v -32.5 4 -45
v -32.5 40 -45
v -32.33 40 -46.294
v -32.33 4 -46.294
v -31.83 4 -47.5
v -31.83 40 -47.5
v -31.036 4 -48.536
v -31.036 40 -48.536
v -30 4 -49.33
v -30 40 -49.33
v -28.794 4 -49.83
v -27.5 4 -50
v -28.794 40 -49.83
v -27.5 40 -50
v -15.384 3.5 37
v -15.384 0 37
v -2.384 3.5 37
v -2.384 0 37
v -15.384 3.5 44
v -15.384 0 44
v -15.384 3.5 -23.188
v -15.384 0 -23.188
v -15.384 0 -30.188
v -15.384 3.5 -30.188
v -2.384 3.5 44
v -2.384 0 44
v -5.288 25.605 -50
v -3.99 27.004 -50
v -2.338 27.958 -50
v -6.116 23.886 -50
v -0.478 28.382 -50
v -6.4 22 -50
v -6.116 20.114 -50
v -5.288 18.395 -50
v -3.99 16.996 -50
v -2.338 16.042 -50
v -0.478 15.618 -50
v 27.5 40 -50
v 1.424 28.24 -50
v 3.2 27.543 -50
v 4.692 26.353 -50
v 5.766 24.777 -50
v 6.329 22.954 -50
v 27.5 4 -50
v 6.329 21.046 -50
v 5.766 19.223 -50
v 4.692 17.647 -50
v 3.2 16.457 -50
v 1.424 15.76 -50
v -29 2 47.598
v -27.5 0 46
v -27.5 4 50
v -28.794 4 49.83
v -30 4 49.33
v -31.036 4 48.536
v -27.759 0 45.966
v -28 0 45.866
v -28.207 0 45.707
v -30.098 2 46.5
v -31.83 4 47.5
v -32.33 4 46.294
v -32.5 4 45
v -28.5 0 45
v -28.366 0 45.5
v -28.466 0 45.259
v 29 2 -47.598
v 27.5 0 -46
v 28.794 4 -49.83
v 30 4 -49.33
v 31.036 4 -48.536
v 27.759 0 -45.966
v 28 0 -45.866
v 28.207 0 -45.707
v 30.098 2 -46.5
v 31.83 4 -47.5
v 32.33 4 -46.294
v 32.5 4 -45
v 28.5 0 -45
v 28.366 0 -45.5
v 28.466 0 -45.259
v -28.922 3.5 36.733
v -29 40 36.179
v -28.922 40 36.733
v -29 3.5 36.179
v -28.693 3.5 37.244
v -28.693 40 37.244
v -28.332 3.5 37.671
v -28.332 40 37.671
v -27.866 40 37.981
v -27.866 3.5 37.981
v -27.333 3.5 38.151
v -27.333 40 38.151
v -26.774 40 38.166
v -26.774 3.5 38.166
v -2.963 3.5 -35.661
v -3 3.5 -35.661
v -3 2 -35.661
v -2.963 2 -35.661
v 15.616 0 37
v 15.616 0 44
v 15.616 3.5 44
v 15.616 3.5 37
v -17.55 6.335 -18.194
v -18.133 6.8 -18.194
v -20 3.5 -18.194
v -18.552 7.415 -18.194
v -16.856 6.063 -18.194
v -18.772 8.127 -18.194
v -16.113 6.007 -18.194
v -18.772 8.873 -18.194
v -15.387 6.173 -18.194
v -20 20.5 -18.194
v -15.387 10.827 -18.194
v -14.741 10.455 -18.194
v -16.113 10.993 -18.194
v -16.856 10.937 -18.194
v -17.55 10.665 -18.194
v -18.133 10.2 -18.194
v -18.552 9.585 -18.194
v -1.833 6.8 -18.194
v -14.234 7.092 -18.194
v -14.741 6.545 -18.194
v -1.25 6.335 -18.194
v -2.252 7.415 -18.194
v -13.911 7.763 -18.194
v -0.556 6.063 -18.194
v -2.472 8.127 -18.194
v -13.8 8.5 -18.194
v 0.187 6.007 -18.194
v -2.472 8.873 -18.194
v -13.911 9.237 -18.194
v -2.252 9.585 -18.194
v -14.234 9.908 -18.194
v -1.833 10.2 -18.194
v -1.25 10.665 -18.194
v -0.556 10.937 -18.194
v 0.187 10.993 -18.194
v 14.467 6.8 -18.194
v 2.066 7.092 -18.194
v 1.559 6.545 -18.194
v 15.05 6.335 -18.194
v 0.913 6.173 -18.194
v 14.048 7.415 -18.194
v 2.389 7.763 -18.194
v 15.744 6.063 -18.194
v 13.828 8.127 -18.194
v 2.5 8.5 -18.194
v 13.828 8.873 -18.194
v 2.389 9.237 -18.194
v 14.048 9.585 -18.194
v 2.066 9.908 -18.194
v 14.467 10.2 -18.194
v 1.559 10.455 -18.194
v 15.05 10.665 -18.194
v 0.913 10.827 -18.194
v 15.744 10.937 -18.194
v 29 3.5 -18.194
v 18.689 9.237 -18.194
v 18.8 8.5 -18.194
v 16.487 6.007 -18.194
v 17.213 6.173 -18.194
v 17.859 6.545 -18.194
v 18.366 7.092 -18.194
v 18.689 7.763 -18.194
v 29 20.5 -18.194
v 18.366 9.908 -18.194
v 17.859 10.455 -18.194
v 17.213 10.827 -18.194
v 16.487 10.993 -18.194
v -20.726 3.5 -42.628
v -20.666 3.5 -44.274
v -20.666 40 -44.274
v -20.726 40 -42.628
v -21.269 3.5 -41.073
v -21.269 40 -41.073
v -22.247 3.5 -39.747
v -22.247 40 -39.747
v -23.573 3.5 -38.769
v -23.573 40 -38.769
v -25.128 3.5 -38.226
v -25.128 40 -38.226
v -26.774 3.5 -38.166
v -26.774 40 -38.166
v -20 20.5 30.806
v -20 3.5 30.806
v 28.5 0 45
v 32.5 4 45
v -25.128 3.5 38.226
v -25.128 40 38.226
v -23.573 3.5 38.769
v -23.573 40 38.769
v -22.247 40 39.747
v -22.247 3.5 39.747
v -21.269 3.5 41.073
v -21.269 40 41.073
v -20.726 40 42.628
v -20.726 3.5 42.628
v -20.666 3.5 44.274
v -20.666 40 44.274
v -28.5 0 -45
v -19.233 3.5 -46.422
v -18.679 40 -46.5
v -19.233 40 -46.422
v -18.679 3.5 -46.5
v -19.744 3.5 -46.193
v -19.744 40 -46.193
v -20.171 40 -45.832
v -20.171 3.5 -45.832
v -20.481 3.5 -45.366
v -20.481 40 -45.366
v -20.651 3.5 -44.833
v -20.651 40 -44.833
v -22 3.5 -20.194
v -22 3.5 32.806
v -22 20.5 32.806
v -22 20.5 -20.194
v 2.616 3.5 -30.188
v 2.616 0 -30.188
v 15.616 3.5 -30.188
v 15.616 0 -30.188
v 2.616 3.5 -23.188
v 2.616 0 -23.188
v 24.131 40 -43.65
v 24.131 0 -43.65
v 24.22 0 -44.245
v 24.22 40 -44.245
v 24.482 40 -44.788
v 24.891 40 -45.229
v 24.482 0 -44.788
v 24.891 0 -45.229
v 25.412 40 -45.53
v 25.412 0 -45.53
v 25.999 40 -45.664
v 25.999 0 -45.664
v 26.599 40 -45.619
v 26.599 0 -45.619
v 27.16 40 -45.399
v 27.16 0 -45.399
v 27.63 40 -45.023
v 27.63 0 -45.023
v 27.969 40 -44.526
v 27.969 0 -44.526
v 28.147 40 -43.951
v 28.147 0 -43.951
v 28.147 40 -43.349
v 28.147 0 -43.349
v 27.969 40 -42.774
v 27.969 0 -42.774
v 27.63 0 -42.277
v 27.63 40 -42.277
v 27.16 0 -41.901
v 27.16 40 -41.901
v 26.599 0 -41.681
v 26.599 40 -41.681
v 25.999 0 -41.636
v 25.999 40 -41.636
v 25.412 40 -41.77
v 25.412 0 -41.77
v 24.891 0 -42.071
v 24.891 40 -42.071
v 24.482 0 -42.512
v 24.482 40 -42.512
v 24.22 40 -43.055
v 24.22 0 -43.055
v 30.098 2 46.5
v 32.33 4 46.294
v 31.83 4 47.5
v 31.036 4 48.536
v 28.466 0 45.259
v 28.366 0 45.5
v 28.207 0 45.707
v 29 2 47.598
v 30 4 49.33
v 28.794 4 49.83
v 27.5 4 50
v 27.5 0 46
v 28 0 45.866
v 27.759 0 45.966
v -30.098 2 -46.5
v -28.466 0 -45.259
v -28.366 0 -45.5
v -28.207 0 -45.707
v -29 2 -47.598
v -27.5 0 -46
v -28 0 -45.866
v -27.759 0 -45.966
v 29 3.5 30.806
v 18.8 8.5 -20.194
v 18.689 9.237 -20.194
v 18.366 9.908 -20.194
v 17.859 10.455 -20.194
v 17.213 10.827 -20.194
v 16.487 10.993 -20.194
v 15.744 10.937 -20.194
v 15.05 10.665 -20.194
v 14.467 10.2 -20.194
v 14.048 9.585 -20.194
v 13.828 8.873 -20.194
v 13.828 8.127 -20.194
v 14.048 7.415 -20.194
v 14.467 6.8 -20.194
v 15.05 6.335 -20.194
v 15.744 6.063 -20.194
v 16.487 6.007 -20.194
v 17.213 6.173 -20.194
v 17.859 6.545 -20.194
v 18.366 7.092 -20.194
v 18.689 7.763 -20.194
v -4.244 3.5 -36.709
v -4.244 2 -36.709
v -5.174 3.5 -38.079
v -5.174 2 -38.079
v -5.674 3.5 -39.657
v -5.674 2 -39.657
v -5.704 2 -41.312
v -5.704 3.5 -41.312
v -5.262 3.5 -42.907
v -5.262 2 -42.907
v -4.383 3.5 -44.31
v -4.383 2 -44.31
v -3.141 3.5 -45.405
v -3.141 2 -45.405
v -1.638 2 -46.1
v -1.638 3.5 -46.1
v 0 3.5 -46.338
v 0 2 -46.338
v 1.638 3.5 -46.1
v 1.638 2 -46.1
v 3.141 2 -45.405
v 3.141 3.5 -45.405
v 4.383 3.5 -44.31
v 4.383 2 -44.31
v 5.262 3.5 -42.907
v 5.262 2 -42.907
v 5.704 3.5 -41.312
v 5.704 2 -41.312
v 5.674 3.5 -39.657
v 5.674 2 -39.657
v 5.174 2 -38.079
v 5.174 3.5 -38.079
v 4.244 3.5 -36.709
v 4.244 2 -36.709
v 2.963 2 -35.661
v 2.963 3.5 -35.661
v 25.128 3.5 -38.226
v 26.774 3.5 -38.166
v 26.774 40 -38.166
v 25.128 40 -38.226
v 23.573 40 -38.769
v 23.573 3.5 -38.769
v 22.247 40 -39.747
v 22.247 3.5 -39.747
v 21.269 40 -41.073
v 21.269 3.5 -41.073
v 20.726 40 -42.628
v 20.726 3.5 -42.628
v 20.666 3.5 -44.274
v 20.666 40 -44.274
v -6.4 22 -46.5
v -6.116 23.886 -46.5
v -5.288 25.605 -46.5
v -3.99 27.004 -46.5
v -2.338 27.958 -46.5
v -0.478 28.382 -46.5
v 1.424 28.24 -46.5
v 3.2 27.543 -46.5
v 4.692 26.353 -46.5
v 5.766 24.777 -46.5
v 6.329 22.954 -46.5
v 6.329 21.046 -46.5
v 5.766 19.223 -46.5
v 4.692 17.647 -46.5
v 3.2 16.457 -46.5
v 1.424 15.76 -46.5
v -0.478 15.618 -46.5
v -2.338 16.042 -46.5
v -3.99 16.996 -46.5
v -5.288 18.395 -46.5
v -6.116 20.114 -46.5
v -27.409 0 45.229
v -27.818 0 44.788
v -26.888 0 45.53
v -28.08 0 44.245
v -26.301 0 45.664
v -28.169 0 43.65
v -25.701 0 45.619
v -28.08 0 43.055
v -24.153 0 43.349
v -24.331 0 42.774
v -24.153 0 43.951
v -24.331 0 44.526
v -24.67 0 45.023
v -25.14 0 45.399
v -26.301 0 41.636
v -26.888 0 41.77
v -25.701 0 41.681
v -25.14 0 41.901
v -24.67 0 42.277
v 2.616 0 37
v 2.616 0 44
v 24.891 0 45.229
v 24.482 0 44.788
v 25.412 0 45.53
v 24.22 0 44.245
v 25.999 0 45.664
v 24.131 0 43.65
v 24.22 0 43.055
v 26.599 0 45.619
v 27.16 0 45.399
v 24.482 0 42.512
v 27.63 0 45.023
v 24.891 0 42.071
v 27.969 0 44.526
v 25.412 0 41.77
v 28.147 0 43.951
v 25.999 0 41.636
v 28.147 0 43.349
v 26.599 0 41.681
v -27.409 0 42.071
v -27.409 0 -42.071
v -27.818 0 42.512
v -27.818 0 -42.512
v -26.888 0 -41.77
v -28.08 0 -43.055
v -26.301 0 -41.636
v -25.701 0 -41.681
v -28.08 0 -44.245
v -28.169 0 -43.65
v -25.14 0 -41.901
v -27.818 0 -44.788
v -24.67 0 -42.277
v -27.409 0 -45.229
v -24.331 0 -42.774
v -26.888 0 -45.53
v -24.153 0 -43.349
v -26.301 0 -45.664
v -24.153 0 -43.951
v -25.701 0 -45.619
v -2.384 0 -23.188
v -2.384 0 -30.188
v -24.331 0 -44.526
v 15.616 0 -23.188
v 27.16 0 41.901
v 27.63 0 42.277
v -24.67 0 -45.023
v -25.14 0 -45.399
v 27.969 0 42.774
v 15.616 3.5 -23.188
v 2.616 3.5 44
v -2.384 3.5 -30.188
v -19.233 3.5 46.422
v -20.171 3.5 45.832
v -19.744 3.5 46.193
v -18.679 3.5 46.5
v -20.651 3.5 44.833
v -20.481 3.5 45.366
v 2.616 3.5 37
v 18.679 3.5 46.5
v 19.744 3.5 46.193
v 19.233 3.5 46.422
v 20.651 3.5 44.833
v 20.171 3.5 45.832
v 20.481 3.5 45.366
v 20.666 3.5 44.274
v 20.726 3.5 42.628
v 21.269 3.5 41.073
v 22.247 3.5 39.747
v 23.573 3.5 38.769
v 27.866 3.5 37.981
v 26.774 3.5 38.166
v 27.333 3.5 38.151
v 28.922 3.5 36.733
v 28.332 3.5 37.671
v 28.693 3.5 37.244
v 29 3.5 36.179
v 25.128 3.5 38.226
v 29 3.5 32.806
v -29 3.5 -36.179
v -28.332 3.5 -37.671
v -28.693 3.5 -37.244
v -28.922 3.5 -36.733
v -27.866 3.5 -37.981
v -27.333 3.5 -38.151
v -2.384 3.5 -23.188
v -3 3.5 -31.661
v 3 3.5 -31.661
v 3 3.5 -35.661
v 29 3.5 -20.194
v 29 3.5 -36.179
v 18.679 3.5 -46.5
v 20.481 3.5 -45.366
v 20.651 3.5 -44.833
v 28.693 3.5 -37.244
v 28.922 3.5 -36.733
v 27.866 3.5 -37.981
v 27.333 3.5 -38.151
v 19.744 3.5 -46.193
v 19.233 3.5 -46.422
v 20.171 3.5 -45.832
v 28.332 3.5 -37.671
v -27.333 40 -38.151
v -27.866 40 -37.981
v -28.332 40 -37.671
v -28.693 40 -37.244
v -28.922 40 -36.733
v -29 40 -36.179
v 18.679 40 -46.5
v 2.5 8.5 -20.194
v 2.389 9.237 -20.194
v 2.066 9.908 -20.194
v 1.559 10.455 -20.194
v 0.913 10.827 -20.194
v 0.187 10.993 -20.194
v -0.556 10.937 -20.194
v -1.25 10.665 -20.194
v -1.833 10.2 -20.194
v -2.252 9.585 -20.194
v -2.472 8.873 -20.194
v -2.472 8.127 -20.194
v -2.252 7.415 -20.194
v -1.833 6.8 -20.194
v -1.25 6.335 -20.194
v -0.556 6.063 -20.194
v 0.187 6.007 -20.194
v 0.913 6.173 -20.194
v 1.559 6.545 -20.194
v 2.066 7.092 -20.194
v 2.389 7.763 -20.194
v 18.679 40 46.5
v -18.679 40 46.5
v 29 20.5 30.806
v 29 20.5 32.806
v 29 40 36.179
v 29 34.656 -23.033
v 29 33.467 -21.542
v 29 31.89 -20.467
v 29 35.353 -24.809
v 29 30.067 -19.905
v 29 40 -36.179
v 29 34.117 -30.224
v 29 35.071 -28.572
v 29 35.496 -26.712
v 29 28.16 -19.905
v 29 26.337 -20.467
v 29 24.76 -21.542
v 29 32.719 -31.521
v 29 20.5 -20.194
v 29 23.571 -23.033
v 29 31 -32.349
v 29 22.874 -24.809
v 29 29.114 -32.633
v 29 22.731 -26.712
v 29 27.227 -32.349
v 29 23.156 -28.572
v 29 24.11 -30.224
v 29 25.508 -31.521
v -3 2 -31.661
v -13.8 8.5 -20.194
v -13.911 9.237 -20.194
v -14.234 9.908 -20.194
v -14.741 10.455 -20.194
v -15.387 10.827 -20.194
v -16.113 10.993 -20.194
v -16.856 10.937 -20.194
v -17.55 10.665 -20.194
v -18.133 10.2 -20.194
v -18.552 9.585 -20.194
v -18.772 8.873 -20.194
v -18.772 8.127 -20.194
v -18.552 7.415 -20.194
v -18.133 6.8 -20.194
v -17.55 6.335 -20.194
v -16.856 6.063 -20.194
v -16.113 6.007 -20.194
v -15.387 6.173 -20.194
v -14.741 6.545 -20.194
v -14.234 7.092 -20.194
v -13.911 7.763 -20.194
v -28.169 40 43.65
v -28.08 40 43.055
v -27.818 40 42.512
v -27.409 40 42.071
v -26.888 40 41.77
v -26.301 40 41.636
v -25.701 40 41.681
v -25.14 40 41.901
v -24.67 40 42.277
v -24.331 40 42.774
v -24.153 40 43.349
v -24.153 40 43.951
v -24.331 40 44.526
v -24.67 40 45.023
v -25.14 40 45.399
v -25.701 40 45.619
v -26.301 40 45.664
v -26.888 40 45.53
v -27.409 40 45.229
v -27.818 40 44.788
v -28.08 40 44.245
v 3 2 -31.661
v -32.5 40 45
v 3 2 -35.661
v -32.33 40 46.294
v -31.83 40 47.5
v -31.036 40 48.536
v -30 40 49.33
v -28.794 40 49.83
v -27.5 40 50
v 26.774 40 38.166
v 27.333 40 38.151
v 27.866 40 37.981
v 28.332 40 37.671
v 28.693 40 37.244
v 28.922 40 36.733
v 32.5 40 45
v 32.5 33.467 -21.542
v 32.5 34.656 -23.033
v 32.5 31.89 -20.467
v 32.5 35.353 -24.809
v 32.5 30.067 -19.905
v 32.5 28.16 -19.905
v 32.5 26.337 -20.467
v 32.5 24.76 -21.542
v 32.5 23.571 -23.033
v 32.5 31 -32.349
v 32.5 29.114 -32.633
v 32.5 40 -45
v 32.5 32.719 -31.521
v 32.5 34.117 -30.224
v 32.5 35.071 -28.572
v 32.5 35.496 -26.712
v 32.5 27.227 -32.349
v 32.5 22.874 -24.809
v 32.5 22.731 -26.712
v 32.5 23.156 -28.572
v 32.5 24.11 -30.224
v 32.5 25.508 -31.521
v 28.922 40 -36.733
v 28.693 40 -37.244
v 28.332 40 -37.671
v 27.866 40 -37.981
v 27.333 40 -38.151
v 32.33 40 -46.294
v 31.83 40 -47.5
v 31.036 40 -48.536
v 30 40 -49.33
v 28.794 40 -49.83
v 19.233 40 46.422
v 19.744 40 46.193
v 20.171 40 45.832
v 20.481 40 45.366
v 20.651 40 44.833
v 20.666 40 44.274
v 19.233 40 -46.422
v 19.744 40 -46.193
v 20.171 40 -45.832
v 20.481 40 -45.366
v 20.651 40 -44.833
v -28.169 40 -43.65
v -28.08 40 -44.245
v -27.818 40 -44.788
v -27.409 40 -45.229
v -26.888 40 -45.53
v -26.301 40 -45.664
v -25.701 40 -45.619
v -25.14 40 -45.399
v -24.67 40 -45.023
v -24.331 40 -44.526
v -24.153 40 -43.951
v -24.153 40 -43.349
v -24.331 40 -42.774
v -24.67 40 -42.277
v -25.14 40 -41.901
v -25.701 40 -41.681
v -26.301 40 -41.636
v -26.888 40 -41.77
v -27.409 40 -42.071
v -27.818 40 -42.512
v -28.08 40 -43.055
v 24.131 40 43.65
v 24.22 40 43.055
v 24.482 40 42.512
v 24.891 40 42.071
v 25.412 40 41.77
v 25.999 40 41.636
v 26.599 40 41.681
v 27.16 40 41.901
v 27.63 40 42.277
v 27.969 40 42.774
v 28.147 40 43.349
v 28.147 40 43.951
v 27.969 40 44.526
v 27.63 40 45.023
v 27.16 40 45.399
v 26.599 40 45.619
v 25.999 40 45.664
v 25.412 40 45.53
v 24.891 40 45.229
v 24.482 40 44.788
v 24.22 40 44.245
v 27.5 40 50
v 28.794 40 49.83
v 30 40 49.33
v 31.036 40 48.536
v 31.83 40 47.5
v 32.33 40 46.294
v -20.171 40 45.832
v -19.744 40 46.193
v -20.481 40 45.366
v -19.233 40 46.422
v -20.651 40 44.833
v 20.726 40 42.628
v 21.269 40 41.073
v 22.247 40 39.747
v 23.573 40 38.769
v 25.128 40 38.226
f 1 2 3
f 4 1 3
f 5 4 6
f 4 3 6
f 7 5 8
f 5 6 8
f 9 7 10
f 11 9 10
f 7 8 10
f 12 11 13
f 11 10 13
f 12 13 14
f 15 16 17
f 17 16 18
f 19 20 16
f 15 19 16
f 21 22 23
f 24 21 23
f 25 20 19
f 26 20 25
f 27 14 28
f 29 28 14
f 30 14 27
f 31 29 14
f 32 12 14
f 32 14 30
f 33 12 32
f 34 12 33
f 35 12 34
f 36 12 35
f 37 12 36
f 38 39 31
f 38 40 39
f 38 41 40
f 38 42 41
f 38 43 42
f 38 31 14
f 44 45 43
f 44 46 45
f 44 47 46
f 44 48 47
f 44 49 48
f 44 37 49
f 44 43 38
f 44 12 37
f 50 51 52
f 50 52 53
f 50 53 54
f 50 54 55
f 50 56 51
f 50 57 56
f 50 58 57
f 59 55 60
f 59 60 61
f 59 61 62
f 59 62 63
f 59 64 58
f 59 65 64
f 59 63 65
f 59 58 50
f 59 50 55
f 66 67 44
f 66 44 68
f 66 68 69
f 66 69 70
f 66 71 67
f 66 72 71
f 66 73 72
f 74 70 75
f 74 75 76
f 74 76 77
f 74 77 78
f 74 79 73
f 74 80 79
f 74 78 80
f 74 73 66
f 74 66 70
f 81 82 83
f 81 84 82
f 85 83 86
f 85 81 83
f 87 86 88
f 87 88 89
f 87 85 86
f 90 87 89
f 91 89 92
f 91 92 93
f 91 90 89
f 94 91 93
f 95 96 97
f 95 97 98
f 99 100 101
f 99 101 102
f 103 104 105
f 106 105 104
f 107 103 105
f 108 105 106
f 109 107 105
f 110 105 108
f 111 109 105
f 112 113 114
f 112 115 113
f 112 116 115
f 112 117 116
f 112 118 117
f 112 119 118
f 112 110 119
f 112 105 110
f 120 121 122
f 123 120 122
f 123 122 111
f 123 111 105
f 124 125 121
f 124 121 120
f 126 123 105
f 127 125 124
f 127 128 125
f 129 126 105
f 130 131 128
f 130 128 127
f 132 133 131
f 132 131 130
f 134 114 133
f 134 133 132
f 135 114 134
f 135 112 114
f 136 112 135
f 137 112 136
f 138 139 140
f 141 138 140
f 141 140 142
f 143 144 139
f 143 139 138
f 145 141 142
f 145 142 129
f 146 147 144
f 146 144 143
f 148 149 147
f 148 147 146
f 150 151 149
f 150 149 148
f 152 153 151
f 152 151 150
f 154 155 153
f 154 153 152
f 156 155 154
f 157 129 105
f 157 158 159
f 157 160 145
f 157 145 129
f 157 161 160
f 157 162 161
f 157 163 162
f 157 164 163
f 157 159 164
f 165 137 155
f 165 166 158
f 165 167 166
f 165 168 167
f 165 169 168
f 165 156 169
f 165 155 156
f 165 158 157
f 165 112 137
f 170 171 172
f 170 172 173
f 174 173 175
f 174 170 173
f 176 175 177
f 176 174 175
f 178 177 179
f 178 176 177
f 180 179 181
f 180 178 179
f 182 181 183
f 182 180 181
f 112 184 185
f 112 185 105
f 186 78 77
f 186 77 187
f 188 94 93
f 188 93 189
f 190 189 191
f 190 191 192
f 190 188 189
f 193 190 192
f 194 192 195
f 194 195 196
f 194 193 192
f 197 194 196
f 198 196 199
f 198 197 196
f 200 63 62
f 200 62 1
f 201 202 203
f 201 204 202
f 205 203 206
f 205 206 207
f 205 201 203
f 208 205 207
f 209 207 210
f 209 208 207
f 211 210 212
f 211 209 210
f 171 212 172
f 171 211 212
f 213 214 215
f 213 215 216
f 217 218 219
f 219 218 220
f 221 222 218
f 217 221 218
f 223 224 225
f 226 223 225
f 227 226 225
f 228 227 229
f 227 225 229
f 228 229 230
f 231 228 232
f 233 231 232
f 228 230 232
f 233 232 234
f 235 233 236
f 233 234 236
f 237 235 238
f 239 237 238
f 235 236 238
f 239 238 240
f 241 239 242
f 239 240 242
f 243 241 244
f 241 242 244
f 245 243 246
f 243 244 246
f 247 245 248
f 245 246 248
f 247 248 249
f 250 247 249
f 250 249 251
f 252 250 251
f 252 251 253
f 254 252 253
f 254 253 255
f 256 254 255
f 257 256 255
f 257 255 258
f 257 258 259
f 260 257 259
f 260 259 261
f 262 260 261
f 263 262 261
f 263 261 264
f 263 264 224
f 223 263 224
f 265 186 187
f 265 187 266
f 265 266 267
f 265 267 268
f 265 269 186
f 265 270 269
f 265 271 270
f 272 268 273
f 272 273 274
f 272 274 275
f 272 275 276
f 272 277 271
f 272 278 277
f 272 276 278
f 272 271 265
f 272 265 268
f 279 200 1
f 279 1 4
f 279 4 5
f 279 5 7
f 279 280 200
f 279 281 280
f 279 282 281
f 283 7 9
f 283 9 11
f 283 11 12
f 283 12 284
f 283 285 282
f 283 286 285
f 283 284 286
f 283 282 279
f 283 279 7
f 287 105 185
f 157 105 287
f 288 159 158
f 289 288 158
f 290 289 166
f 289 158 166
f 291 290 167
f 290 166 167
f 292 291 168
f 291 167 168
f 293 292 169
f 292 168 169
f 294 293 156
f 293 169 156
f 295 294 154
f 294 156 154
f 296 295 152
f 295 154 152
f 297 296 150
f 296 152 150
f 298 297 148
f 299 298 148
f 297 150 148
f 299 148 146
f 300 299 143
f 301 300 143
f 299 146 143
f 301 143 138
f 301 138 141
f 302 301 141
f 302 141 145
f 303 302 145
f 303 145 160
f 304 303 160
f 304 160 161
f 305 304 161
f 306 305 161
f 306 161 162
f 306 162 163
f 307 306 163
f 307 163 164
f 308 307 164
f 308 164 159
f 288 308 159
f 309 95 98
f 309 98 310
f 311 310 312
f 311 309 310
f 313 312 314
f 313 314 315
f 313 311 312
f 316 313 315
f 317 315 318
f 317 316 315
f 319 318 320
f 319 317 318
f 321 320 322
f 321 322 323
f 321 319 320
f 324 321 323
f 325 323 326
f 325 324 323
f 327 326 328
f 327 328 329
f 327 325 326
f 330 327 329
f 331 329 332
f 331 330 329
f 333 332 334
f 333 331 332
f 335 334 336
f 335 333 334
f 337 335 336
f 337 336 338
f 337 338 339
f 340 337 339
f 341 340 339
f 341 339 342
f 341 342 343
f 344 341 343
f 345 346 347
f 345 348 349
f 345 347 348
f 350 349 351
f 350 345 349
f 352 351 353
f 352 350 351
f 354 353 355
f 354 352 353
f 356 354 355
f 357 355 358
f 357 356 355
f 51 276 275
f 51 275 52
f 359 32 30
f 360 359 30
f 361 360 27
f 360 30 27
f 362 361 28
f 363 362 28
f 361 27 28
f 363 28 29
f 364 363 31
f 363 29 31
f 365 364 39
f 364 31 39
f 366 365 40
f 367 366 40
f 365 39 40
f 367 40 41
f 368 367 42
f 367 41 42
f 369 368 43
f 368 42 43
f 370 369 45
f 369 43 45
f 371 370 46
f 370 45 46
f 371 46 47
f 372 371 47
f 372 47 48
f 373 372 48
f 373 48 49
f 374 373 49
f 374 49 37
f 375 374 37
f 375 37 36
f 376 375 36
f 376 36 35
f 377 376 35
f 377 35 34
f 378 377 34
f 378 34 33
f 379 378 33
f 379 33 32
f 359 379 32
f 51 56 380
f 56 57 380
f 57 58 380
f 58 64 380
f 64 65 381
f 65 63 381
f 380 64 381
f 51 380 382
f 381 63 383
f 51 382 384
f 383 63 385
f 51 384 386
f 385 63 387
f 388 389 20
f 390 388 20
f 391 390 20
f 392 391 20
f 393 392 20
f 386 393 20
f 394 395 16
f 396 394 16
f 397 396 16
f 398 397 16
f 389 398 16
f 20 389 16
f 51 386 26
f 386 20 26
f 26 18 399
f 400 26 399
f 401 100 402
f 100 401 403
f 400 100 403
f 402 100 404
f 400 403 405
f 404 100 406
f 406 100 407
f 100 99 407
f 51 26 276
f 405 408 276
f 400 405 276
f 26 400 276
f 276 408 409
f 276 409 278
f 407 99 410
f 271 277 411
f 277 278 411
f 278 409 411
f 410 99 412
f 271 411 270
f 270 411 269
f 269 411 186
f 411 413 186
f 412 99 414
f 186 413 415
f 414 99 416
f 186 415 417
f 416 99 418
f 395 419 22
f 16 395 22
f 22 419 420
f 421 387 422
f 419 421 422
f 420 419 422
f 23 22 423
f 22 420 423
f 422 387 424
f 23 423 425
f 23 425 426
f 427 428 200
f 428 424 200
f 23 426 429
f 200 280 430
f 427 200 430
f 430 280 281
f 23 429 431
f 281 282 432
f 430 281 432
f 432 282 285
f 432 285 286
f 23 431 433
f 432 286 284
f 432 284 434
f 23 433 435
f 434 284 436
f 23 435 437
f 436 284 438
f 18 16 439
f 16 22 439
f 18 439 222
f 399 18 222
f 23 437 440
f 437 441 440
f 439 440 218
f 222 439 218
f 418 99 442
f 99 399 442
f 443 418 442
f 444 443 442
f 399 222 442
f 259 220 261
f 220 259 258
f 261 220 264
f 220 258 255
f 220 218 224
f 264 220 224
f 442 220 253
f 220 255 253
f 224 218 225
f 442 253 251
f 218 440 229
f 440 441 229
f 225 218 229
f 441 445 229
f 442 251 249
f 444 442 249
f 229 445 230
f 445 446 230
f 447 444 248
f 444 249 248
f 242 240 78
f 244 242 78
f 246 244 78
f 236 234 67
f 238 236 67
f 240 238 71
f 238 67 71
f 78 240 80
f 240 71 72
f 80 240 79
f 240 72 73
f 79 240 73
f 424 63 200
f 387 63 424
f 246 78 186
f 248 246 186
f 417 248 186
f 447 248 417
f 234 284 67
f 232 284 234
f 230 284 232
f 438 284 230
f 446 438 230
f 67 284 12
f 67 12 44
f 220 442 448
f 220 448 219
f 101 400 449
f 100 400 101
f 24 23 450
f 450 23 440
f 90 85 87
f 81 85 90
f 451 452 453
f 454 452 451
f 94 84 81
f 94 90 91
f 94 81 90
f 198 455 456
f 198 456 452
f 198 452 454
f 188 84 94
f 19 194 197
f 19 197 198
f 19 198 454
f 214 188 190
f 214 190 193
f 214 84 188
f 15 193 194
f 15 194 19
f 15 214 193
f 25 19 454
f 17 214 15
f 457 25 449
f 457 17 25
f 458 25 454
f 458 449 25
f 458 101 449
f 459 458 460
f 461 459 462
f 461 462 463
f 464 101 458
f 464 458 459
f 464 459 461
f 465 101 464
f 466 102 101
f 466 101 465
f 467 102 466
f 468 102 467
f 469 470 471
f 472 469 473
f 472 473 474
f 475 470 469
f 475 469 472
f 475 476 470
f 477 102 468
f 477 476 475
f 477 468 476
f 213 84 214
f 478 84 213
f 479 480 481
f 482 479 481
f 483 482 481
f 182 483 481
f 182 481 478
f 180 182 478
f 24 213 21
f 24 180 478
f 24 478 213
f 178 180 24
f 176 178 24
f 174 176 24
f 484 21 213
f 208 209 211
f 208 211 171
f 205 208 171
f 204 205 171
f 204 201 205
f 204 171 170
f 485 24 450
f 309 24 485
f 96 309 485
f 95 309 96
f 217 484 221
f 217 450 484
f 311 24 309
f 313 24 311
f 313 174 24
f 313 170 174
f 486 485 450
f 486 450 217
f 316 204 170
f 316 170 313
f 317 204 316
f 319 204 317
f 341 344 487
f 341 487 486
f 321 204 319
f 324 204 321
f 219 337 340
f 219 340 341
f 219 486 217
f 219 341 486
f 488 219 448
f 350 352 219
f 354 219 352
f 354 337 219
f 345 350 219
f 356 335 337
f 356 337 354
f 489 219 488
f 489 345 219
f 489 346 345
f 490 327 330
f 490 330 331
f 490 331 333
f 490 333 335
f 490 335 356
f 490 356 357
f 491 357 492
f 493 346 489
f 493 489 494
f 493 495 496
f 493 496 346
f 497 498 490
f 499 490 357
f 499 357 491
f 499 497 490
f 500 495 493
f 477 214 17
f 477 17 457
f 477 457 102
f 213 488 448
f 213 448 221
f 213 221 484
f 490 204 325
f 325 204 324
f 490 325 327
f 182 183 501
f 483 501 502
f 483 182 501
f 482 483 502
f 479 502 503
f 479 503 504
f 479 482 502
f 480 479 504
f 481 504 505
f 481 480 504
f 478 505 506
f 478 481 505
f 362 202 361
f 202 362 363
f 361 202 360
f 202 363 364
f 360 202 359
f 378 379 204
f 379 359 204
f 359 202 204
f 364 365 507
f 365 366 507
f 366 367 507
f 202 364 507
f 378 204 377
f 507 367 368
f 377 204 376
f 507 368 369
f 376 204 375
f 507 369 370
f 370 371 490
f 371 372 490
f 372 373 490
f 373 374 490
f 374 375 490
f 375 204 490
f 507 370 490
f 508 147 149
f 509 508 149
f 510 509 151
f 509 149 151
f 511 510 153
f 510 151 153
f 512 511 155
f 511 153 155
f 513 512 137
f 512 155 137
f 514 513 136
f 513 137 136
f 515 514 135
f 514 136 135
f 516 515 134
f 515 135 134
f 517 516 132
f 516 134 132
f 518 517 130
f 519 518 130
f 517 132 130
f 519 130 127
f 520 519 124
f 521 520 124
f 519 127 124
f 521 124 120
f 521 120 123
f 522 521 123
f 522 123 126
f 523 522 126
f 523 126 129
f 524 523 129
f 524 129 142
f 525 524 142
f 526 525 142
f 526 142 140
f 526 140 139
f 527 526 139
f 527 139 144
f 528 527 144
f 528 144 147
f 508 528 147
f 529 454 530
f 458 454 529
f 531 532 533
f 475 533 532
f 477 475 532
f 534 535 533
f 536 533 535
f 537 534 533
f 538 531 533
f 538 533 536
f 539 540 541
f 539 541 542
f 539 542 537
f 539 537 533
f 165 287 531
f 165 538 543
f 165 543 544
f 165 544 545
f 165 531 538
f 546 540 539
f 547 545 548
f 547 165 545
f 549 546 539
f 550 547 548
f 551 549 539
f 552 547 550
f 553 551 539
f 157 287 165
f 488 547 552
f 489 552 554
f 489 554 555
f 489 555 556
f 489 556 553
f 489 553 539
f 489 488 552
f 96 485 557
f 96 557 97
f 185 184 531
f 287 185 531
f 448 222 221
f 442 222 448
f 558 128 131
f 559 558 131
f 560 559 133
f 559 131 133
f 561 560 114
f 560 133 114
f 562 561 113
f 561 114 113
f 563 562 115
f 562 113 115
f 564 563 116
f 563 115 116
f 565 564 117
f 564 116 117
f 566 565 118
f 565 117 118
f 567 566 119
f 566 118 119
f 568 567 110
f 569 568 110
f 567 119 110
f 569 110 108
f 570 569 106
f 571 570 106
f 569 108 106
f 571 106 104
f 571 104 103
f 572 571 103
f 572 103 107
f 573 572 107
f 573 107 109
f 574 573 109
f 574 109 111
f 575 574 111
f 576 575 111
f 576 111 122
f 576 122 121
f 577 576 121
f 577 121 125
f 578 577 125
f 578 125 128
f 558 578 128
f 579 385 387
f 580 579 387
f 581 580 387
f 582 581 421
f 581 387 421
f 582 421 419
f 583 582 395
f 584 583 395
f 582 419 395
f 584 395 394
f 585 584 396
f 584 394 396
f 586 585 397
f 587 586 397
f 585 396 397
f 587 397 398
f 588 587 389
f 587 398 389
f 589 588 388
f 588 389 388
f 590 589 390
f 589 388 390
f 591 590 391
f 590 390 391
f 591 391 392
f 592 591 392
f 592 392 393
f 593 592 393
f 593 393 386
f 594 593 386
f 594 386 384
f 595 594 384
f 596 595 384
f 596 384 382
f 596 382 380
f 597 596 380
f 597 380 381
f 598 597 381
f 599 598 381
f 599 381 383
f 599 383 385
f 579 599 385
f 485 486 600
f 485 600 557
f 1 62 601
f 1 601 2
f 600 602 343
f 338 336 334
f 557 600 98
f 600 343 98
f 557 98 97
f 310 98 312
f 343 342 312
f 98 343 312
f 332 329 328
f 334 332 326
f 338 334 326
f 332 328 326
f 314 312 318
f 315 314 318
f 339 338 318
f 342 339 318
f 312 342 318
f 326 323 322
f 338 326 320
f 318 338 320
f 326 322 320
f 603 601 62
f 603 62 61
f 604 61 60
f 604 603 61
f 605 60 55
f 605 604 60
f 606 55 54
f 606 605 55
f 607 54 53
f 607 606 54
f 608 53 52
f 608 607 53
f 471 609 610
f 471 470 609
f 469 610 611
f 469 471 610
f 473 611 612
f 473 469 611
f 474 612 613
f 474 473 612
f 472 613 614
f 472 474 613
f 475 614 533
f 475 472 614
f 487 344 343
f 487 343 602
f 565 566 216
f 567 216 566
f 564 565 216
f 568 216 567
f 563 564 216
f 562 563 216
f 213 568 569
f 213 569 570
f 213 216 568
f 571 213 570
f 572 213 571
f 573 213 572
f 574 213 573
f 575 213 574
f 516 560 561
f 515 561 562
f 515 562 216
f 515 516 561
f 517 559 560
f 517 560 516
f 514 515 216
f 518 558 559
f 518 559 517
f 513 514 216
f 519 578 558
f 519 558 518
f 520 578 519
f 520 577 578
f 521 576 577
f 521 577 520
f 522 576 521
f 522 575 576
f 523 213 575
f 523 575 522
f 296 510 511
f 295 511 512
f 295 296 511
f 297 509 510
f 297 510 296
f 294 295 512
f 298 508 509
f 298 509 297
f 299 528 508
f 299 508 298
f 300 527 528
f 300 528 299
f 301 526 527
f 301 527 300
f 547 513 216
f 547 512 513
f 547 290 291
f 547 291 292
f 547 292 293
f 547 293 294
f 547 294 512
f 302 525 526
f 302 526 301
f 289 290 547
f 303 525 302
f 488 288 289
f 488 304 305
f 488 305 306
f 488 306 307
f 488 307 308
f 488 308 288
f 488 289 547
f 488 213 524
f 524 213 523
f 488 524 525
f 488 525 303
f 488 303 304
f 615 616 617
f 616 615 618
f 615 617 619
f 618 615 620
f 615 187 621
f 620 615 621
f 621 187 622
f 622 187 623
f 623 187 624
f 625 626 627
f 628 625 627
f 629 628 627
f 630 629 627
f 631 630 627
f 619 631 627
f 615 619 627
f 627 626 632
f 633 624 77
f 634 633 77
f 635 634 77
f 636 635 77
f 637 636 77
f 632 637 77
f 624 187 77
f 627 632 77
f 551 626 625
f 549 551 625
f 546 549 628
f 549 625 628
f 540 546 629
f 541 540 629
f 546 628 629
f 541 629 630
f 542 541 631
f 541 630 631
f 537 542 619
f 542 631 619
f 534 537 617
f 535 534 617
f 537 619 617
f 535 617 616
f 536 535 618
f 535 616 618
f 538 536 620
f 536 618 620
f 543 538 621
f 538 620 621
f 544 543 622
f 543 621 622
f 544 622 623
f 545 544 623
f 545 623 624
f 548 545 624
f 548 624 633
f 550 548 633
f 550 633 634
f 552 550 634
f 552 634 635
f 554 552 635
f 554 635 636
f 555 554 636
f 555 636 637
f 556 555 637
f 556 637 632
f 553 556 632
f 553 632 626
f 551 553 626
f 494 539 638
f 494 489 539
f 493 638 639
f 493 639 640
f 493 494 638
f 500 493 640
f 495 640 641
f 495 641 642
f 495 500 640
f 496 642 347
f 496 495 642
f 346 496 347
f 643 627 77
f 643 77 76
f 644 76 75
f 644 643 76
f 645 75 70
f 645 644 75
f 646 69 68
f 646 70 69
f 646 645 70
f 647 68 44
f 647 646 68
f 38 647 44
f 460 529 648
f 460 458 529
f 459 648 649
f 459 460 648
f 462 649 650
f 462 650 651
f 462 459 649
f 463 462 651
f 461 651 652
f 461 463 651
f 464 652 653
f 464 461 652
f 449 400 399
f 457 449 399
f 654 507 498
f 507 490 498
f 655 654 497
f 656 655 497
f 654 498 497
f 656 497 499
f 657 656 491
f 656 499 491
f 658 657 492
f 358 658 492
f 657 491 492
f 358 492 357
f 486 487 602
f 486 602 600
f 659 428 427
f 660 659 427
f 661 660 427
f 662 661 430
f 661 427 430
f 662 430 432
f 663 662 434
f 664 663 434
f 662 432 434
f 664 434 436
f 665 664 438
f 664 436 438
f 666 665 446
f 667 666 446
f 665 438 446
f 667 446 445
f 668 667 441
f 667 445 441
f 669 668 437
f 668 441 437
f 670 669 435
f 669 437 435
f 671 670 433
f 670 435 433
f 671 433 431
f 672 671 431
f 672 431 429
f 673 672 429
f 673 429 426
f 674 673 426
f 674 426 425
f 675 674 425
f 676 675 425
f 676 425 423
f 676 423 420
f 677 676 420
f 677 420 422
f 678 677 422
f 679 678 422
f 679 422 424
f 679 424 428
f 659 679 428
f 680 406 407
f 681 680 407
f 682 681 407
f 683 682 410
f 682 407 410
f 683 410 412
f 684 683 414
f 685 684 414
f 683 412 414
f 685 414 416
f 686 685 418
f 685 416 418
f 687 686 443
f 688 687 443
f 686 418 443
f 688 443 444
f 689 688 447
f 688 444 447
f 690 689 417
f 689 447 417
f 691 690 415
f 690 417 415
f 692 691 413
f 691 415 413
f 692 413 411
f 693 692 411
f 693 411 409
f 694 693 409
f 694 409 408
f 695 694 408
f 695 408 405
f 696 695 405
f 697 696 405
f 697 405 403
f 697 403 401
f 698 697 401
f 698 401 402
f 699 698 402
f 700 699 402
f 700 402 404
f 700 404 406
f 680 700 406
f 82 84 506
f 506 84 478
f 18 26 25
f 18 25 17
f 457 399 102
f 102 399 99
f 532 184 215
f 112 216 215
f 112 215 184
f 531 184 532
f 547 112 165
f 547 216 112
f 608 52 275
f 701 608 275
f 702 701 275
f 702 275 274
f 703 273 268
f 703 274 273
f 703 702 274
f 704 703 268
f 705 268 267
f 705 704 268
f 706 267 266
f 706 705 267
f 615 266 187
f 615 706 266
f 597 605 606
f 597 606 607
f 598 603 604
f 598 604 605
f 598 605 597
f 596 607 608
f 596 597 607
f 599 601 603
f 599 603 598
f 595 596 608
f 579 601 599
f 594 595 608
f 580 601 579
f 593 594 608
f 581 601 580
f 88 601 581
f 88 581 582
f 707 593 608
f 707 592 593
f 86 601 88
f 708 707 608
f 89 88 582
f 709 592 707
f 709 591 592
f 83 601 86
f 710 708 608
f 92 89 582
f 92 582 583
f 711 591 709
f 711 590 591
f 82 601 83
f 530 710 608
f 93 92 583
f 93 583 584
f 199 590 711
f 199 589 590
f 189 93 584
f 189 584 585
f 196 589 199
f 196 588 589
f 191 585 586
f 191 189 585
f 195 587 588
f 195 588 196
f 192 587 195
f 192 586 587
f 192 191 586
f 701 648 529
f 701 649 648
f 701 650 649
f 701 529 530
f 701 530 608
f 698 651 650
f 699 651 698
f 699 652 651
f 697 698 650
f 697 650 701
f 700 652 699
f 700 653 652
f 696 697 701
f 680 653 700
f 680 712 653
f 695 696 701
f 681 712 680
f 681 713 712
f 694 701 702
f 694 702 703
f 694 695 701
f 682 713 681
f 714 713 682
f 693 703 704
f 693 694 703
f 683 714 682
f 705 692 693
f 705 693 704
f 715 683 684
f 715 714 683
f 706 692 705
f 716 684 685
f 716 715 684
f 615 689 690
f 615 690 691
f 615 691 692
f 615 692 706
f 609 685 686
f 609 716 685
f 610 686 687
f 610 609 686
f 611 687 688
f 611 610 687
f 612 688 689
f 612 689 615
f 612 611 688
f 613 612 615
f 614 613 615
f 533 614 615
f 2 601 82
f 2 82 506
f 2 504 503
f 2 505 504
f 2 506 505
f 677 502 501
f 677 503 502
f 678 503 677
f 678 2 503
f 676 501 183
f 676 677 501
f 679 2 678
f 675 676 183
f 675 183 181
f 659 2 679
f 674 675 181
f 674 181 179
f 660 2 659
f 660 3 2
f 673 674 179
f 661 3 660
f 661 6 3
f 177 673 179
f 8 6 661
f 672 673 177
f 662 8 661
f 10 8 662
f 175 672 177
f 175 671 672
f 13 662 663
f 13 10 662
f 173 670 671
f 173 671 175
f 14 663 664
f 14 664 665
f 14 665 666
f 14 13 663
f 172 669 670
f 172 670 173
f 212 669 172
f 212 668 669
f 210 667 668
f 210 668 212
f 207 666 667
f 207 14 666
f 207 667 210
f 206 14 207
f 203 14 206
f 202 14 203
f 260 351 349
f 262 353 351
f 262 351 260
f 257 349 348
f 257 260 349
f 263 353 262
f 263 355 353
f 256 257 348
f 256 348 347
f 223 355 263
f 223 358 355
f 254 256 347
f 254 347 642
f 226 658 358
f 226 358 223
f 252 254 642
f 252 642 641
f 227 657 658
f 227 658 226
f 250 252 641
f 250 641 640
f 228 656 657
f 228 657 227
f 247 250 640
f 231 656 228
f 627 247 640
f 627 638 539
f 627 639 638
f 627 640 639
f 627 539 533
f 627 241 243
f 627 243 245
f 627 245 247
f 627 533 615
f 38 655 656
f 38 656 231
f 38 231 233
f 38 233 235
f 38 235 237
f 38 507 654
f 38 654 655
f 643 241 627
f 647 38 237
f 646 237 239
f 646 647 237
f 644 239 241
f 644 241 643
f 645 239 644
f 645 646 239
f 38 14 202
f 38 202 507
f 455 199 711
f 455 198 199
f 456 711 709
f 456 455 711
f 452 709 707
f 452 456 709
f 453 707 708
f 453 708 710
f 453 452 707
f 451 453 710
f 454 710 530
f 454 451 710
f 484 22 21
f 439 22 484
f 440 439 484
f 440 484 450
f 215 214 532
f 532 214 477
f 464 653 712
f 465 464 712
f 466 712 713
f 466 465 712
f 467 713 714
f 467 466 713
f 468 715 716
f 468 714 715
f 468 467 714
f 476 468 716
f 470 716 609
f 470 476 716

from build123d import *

# Parameters (mm, degrees)
SKETCH3_W                   = 65
SKETCH3_H                   = 100
BOSS_EXTRUDE1_DEPTH         = 40
F_21_0_159_DIAMETER_HOLE1_D = 4.0386
SHELL1_T                    = -3.5
FILLET1_R                   = 2
SKETCH14_W                  = 13
SKETCH14_H                  = 7
CUT_EXTRUDE1_DEPTH          = 10
FILLET2_R                   = 5
CHAMFER2_SIZE               = 4
SKETCH15_R                  = 6.4
CUT_EXTRUDE3_DEPTH          = 10
SKETCH17_R                  = 6.4
CUT_EXTRUDE6_DEPTH          = 10
CUT_EXTRUDE8_DEPTH          = 1.5
SKETCH20_W                  = 51
SKETCH20_H                  = 53
BOSS_EXTRUDE3_DEPTH         = 17
SKETCH22_W                  = 49
SKETCH22_H                  = 49
CUT_EXTRUDE9_DEPTH          = 17
SKETCH23_R                  = 2.5
CUT_EXTRUDE10_DEPTH         = 3


with BuildPart() as part:
    # Sketch3 → Boss-Extrude1 (new body)
    with BuildSketch(Plane(origin=(0, 0, 0), x_dir=(1, 0, 0), z_dir=(0, 1, 0))):
        Rectangle(SKETCH3_W, SKETCH3_H)
    extrude(amount=BOSS_EXTRUDE1_DEPTH)

    # #21 (0.159) Diameter Hole1 (through all)
    with Locations(Plane(origin=(0, 40, 0), x_dir=(1, 0, 0), z_dir=(0, 1, 0))):
        with Locations((-26.15, 43.65), (26.15, 43.65), (26.15, -43.65), (-26.15, -43.65)):
            Hole(F_21_0_159_DIAMETER_HOLE1_D / 2)

    # Shell1
    shell1_openings = [part.faces().sort_by_distance(p)[0] for p in [
        (0, 40, 0),
    ]]
    offset(amount=SHELL1_T, openings=shell1_openings, kind=Kind.INTERSECTION)

    # Fillet1
    fillet1_edges = [part.edges().sort_by_distance(p)[0] for p in [
        (29, 21.75, 38.923460834),
        (21.423460834, 21.75, -46.5),
        (-29, 21.75, -38.923460834),
        (-21.423460834, 21.75, 46.5),
        (-29, 21.75, 38.923460834),
        (21.423460834, 21.75, 46.5),
        (29, 21.75, -38.923460834),
        (-21.423460834, 21.75, -46.5),
    ]]
    fillet(fillet1_edges, radius=FILLET1_R)

    # Sketch14 → Cut-Extrude1 (cut)
    with BuildSketch(Plane(origin=(0, 0, 0), x_dir=(1, 0, 0), z_dir=(0, 1, 0))):
        with Locations((-8.88380044, -40.5)):
            Rectangle(SKETCH14_W, SKETCH14_H)
        with Locations((9.11619956, -40.5)):
            Rectangle(SKETCH14_W, SKETCH14_H)
        with Locations((-8.88380044, 26.688454416)):
            Rectangle(SKETCH14_W, SKETCH14_H)
        with Locations((9.11619956, 26.688454416)):
            Rectangle(SKETCH14_W, SKETCH14_H)
    extrude(amount=CUT_EXTRUDE1_DEPTH, mode=Mode.SUBTRACT)

    # Fillet2
    fillet2_edges = [part.edges().sort_by_distance(p)[0] for p in [
        (32.5, 20, 50),
        (-32.5, 20, 50),
        (-32.5, 20, -50),
        (32.5, 20, -50),
    ]]
    fillet(fillet2_edges, radius=FILLET2_R)

    # Chamfer2
    chamfer2_edges = [part.edges().sort_by_distance(p)[0] for p in [
        (-31.035533906, 0, -48.535533906),
        (-31.035533906, 0, 48.535533906),
        (31.035533906, 0, -48.535533906),
        (31.035533906, 0, 48.535533906),
        (32.5, 0, 0),
    ]]
    chamfer(chamfer2_edges, length=CHAMFER2_SIZE)

    # Sketch15 → Cut-Extrude3 (cut)
    with BuildSketch(Plane(origin=(0, 0, -50), x_dir=(-1, 0, 0), z_dir=(0, 0, -1))):
        with Locations((0, 22)):
            Circle(SKETCH15_R)
    extrude(amount=-CUT_EXTRUDE3_DEPTH, mode=Mode.SUBTRACT)

    # Sketch17 → Cut-Extrude6 (cut)
    with BuildSketch(Plane(origin=(32.5, 0, 0), x_dir=(0, 0, -1), z_dir=(1, 0, 0))):
        with Locations((26.233387705, 29.113582019)):
            Circle(SKETCH17_R)
    extrude(amount=-CUT_EXTRUDE6_DEPTH, mode=Mode.SUBTRACT)

    # Sketch18 → Cut-Extrude8 (cut)
    with BuildSketch(Plane(origin=(0, 3.5, 0), x_dir=(1, 0, 0), z_dir=(0, 1, 0))):
        with BuildLine():
            Line((2.962903006, 35.660547198), (3, 35.660547198))
            Line((3, 35.660547198), (3, 31.660547198))
            Line((3, 31.660547198), (-3, 31.660547198))
            Line((-3, 31.660547198), (-3, 35.660547198))
            Line((-3, 35.660547198), (-2.962903006, 35.660547198))
            ThreePointArc((-2.962903006, 35.660547198), (0, 46.338397214), (2.962903006, 35.660547198))
        make_face()
    extrude(amount=-CUT_EXTRUDE8_DEPTH, mode=Mode.SUBTRACT)

    # Sketch20 → Boss-Extrude3 (add)
    with BuildSketch(Plane(origin=(0, 3.5, 0), x_dir=(1, 0, 0), z_dir=(0, 1, 0))):
        with Locations((3.5, -6.305895328)):
            Rectangle(SKETCH20_W, SKETCH20_H)
    extrude(amount=BOSS_EXTRUDE3_DEPTH)

    # Sketch22 → Cut-Extrude9 (cut)
    with BuildSketch(Plane(origin=(0, 20.5, 0), x_dir=(1, 0, 0), z_dir=(0, 1, 0))):
        with Locations((4.5, -6.305895328)):
            Rectangle(SKETCH22_W, SKETCH22_H)
    extrude(amount=-CUT_EXTRUDE9_DEPTH, mode=Mode.SUBTRACT)

    # Sketch23 → Cut-Extrude10 (cut)
    with BuildSketch(Plane.XY.offset(-18.194104672)):
        with Locations((-16.3, 8.5)):
            Circle(SKETCH23_R)
        with Locations((0, 8.5)):
            Circle(SKETCH23_R)
        with Locations((16.3, 8.5)):
            Circle(SKETCH23_R)
    extrude(amount=-CUT_EXTRUDE10_DEPTH, mode=Mode.SUBTRACT)


solid = part.part
